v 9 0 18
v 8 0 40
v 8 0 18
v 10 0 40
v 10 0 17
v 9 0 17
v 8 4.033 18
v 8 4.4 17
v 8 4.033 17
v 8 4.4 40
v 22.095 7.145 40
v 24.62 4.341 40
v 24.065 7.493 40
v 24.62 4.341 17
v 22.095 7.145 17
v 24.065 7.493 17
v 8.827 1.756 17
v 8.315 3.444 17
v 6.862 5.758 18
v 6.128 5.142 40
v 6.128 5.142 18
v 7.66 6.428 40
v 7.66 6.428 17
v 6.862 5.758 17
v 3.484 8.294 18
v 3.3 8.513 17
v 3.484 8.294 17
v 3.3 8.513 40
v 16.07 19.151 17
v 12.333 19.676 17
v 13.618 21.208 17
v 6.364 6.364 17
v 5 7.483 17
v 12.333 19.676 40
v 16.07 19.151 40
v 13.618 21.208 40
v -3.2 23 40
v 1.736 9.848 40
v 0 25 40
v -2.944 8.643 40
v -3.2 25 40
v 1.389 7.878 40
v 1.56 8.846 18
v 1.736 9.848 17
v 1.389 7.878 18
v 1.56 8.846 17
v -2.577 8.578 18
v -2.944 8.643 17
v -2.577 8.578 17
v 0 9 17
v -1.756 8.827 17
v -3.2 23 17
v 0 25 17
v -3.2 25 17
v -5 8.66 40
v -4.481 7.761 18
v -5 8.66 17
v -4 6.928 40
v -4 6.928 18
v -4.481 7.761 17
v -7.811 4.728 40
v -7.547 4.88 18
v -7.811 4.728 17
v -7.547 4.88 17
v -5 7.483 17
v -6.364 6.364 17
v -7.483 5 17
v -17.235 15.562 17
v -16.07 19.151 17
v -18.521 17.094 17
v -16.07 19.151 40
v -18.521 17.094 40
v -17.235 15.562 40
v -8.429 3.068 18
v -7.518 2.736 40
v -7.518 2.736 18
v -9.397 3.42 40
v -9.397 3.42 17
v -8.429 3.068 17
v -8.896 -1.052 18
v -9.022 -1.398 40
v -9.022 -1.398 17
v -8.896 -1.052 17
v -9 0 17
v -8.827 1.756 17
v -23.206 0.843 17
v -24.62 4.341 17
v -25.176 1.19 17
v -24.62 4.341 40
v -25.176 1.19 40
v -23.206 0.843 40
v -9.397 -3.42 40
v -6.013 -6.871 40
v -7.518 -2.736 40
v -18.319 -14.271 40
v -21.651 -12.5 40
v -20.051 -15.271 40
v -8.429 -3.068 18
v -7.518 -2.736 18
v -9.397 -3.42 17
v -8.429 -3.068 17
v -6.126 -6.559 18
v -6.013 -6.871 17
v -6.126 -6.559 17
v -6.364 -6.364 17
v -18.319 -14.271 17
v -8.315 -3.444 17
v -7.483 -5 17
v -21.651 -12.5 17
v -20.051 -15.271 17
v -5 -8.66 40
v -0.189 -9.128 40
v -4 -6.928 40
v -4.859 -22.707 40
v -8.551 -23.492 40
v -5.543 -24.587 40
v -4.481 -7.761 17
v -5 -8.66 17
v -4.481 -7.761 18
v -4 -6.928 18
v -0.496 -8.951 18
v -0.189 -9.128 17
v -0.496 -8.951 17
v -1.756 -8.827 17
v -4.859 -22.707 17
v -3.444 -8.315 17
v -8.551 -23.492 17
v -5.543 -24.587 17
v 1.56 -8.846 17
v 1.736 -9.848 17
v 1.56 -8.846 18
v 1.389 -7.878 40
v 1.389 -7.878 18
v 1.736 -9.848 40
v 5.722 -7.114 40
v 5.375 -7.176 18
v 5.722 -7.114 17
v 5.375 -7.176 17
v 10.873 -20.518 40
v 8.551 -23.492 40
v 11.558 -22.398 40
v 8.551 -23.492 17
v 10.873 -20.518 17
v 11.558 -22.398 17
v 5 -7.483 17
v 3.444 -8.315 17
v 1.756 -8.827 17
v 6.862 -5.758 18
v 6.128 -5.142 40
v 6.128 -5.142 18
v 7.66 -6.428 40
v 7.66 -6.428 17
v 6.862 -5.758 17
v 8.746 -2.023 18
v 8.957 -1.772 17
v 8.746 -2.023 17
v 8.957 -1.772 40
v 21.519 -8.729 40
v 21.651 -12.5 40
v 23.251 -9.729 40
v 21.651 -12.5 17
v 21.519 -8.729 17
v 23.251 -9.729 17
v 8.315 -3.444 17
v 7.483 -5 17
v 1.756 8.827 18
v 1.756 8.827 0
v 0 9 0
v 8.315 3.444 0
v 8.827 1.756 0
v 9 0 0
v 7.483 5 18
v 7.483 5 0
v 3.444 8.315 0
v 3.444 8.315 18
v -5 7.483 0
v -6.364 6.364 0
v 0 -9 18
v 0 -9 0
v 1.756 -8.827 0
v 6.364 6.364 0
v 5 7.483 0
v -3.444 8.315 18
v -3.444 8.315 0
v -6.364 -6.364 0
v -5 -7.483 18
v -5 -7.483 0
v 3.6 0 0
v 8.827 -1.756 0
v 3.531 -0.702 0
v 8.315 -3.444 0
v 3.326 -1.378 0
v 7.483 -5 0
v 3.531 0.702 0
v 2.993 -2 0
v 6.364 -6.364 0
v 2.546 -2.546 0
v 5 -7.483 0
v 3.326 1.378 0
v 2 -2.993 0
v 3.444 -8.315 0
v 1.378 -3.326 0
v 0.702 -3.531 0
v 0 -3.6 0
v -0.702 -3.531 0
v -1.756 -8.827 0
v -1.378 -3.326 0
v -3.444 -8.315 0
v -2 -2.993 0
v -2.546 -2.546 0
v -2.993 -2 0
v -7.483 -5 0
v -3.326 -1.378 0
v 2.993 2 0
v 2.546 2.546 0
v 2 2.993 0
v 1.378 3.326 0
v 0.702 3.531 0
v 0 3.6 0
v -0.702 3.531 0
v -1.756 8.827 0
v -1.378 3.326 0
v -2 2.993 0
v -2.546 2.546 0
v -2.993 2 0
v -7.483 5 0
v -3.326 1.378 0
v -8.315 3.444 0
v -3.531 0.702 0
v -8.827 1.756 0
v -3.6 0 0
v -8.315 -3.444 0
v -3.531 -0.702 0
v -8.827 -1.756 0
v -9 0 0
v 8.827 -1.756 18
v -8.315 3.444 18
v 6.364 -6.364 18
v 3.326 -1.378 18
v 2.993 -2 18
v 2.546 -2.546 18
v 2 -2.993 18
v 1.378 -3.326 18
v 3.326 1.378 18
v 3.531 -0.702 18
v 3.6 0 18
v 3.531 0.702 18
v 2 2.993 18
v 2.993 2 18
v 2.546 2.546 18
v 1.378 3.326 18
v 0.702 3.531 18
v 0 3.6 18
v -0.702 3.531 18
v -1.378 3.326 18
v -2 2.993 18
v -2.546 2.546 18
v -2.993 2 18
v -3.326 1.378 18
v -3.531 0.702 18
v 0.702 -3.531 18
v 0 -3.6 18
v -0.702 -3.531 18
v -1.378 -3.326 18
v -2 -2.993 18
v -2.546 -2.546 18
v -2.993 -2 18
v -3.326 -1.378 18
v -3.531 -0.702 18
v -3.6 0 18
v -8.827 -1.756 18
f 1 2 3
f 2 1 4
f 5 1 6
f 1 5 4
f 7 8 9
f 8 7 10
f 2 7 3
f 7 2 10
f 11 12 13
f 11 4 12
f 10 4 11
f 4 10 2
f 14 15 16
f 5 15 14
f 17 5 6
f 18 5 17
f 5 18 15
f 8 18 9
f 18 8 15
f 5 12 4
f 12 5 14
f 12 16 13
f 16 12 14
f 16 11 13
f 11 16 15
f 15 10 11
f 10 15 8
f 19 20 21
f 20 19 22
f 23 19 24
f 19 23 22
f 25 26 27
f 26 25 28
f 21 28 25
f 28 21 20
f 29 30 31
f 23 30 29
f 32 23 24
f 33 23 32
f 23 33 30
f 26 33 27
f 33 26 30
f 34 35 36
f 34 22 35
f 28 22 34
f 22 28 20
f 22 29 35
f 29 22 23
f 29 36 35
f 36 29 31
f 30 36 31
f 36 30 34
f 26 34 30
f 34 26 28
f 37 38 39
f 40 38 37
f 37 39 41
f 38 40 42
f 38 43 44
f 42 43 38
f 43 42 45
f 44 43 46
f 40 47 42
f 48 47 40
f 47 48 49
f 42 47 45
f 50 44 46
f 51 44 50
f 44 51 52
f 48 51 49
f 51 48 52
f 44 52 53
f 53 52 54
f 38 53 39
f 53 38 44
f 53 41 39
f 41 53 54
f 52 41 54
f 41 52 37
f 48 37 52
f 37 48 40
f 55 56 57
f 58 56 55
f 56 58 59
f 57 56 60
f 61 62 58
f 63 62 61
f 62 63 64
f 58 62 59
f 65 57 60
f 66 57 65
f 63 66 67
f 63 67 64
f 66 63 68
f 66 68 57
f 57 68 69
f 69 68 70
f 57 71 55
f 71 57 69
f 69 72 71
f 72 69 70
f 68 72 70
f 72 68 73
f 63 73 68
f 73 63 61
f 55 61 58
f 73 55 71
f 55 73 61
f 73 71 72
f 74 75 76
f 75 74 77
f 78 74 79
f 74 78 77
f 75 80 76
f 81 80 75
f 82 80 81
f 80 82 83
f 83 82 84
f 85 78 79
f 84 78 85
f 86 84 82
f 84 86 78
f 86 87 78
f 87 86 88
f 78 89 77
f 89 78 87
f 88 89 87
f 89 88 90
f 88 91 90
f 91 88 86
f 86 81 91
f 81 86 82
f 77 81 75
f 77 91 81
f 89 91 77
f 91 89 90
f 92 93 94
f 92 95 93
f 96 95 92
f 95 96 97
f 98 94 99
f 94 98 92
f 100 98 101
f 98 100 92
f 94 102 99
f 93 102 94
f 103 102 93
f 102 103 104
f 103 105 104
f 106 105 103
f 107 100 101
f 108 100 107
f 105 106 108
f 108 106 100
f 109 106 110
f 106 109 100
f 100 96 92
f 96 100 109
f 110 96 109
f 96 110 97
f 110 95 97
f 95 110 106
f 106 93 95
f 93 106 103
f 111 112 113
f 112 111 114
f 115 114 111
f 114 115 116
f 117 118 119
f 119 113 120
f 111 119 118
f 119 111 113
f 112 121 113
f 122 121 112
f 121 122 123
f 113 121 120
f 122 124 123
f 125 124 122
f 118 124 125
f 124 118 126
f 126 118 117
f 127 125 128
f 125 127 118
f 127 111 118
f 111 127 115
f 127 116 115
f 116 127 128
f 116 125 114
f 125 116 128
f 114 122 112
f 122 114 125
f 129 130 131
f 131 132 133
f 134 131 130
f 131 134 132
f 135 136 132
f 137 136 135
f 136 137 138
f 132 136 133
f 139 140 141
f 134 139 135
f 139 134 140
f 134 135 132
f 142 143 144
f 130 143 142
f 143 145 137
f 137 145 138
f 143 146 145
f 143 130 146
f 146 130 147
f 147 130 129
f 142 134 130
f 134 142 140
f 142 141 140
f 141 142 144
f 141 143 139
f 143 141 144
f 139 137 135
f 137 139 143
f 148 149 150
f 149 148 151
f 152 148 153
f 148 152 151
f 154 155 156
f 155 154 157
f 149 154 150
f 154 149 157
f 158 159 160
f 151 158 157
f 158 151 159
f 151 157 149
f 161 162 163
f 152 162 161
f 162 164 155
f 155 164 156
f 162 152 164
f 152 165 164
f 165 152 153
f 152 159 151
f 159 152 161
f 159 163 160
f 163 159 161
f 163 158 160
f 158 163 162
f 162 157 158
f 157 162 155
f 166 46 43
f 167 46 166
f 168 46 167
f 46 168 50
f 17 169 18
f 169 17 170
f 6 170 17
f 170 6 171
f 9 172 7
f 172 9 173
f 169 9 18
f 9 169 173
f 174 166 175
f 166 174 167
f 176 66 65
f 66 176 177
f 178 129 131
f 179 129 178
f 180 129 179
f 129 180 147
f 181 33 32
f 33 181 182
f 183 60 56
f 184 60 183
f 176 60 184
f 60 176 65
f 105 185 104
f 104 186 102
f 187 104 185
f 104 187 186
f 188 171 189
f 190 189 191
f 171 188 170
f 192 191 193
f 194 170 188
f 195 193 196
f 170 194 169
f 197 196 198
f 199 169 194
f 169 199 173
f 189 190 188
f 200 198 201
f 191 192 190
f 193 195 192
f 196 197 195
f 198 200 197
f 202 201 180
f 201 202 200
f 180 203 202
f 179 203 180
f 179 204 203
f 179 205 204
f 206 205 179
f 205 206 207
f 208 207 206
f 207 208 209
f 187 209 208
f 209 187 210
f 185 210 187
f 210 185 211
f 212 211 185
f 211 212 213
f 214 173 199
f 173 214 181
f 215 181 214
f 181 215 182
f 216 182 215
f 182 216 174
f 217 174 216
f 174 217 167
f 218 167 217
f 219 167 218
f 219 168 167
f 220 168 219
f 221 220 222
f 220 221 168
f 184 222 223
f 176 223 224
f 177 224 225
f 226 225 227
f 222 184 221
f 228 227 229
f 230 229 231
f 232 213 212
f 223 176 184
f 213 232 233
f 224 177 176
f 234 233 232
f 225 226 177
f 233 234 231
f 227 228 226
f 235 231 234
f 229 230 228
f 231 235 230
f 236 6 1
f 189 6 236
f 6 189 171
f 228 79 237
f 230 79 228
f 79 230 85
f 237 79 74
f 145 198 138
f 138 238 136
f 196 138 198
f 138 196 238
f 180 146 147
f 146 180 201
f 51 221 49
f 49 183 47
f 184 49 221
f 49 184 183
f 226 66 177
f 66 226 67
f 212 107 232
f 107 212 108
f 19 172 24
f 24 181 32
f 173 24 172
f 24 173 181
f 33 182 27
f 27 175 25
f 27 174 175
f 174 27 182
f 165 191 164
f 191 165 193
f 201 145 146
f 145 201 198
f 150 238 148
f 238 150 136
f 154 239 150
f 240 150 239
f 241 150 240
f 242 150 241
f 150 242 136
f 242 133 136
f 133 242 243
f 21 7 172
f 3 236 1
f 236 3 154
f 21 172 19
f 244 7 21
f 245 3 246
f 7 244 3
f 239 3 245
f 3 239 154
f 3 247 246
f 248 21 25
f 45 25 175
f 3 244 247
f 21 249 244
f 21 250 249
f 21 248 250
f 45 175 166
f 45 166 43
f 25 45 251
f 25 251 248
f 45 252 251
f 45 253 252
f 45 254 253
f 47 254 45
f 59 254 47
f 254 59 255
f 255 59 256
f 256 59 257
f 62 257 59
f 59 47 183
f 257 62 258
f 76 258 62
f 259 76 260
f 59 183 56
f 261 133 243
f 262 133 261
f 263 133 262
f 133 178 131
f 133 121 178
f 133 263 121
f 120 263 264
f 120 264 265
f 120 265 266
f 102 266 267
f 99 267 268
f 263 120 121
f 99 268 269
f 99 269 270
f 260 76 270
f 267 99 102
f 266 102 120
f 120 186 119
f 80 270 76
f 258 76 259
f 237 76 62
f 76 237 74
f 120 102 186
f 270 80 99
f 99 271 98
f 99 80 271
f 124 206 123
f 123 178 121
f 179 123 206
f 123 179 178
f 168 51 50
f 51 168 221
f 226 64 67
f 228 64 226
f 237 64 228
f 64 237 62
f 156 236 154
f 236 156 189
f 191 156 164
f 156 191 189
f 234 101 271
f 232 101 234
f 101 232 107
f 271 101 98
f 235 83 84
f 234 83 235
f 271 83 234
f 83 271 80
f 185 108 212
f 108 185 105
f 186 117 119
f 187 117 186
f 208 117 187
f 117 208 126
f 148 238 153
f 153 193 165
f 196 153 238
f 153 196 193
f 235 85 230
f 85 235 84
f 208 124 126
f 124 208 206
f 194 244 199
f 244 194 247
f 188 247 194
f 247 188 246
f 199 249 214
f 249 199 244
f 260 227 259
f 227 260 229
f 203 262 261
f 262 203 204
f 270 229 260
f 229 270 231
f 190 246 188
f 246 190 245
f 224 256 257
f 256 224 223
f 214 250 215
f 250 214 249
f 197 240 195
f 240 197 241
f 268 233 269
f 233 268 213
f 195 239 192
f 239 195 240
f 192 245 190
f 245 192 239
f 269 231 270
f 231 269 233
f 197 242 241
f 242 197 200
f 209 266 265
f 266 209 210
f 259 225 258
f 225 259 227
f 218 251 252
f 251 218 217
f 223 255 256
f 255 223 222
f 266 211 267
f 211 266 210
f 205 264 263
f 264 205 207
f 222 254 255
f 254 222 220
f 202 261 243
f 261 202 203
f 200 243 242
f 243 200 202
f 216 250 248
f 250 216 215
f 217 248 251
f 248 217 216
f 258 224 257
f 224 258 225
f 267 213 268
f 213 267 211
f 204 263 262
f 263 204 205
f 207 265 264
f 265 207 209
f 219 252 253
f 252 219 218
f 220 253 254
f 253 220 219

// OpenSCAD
$fn = 32;

// ----------------------------------------------------------------------
// Impeller: 50 mm, 9 blades, 40 mm tall
// ----------------------------------------------------------------------

// --- parameters (mm) ---
boss_d = 18;              // hub diameter
boss_h = 18;              // hub height
rotor_d = 50;             // outer diameter over the blades
vane_count = 9;           // number of blades
blade_t = 2;              // blade thickness
blade_h = 22;             // blade height
blade_in_r = 8;           // blade root radius
blade_out_r = 23;         // blade tip radius
sweep = 10;               // blade sweep, degrees
bore_d = 7.2;             // shaft bore

module hub() {
  cylinder(h = boss_h, d = boss_d);
}

module blade() {
  /* blade swept between two boxes: hull of the root and the tip section */
  hull() {
    translate([blade_in_r, 0, boss_h - 1])
      cube([blade_t, blade_t * 2.2, blade_h + 1], center = false);
    rotate([0, 0, sweep])
      translate([blade_out_r, 0, boss_h - 1])
        cube([blade_t, blade_t * 1.6, blade_h + 1], center = false);
  }
}

module blades() {
  for (i = [0 : vane_count - 1])
    rotate([0, 0, i * 360 / vane_count]) blade();
}

difference() {
  union() {
    hub();
    blades();
  }
  translate([0, 0, -1]) cylinder(h = boss_h + blade_h + 0 + 3, d = bore_d);
}
